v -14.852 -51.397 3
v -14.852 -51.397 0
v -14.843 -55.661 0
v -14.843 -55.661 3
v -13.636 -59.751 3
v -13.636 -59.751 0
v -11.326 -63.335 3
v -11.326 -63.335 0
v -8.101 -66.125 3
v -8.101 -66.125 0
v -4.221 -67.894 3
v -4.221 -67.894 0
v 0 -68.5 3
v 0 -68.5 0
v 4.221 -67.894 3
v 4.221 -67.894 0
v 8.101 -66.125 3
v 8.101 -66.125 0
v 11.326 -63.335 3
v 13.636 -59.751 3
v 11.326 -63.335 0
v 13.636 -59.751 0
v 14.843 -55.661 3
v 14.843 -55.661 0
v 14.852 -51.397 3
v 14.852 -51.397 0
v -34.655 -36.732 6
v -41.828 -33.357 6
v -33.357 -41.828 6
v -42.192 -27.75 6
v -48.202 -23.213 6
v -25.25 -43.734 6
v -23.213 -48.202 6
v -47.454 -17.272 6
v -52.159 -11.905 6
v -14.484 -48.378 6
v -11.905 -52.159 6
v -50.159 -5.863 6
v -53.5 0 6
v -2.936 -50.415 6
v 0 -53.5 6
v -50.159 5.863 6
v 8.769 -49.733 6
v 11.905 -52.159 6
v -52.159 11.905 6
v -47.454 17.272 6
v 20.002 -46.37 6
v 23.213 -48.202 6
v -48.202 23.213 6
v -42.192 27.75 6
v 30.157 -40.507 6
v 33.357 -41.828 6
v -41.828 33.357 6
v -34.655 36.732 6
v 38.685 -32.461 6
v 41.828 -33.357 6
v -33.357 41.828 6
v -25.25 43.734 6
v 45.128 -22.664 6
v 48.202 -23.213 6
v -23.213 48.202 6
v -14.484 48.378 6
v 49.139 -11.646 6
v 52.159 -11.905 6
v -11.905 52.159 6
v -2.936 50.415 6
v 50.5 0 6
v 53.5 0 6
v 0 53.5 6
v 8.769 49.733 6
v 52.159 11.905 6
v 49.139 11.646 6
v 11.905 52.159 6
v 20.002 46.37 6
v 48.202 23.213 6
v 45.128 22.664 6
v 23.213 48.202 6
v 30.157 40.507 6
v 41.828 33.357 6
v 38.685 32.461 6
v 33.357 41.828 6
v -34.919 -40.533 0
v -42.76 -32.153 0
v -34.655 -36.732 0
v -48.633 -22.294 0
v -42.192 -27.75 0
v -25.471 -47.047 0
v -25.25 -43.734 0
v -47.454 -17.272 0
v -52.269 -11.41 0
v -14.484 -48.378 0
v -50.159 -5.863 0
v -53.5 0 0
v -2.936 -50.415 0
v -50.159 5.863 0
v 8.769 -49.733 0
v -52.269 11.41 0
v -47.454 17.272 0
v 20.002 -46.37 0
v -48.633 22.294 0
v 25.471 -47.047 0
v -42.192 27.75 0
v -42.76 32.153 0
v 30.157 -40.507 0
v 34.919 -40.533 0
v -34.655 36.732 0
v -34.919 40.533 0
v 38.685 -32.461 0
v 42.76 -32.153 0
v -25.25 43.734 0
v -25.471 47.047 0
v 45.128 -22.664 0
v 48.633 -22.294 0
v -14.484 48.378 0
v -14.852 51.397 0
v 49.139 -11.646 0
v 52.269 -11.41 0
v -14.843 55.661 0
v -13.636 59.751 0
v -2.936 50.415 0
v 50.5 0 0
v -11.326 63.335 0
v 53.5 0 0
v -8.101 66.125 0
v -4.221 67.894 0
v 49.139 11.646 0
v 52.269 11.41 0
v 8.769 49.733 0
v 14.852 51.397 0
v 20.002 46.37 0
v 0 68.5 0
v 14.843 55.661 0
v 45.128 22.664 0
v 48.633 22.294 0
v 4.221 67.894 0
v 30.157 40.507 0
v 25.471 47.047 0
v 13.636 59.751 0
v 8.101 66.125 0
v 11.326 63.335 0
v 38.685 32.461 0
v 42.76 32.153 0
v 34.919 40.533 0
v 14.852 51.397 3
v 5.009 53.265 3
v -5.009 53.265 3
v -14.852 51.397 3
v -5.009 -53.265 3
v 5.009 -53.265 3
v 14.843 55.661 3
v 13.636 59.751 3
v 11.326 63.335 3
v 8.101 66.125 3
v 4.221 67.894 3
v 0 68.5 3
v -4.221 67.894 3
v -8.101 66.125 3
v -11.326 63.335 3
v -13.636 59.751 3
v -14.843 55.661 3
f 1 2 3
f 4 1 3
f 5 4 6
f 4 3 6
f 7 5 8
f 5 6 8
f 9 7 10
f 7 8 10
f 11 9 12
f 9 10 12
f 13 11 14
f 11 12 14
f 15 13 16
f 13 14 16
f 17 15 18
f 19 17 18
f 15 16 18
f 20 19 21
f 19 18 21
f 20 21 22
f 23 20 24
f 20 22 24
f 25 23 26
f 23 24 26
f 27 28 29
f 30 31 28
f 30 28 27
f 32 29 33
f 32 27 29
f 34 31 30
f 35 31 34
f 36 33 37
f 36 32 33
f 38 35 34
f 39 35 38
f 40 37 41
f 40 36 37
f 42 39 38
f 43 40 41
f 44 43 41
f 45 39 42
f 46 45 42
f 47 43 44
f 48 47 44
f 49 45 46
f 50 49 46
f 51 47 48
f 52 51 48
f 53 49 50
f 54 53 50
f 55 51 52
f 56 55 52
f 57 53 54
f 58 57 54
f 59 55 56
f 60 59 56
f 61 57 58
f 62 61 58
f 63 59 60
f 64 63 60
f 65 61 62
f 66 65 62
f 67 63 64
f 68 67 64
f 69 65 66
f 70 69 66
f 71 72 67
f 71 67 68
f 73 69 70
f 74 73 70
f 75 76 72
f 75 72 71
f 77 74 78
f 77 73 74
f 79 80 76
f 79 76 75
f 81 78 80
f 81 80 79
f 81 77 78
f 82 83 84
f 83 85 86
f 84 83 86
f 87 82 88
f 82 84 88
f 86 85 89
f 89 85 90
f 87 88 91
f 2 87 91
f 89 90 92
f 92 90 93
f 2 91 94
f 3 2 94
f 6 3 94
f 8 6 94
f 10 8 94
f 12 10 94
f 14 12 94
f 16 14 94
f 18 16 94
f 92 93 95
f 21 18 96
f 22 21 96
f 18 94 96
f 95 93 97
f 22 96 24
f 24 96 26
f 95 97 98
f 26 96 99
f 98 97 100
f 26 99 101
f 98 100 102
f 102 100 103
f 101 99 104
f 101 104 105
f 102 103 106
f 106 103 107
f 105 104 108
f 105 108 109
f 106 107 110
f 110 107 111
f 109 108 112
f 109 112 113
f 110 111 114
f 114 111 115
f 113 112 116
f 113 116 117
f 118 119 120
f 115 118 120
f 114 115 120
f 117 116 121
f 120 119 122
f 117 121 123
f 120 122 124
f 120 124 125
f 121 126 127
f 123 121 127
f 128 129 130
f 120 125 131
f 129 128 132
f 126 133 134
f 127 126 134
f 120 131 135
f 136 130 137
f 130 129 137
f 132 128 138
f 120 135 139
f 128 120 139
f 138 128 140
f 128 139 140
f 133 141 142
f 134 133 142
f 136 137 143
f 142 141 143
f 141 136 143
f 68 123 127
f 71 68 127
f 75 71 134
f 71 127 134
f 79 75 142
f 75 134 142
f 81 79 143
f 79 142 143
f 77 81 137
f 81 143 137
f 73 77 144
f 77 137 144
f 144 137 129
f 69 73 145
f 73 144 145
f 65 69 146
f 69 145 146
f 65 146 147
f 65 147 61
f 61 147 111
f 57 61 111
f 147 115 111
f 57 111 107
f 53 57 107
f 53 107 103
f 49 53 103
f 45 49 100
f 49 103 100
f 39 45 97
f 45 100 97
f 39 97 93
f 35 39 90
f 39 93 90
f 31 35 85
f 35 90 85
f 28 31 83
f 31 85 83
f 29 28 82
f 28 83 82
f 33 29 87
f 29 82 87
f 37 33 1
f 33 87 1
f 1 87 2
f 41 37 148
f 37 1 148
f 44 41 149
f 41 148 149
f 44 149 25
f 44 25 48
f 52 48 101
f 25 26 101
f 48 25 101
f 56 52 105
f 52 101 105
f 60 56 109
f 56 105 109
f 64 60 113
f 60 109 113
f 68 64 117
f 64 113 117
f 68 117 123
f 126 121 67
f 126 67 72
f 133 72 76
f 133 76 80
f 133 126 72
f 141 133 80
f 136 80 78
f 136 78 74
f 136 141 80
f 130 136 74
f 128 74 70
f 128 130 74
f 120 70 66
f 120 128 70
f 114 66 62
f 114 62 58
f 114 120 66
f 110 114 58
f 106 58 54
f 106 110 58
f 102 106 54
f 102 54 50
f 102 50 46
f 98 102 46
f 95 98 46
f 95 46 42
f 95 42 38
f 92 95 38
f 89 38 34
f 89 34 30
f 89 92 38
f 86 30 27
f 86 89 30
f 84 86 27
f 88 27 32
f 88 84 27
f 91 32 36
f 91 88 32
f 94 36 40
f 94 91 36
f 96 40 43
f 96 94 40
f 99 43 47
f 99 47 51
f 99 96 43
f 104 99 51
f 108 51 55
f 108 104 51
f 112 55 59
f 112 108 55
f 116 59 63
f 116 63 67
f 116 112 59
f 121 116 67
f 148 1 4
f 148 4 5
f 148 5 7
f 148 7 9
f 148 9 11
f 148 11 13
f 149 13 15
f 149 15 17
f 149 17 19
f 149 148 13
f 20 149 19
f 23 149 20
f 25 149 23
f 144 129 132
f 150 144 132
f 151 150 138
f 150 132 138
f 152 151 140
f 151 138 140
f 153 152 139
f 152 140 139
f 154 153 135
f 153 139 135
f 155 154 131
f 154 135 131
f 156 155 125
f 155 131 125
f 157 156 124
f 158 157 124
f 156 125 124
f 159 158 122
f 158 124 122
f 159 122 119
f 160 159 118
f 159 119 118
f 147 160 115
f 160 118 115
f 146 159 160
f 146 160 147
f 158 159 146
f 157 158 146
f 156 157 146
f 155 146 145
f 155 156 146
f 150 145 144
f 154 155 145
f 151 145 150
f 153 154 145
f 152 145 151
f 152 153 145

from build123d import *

# Parameters (mm, degrees)
F0_R     = 53.5
F0_R_2   = 50.5
F1_DEPTH = 6
F3_DEPTH = 3


with BuildPart() as f1:
    # F0 (on Top) → F1 (new body)
    with BuildSketch(Plane.XY):
        Circle(F0_R)
        Circle(F0_R_2, mode=Mode.SUBTRACT)
    extrude(amount=F1_DEPTH)

    # F2 (on Top) → F3 (join)
    with BuildSketch(Plane.XY):
        with BuildLine():
            ThreePointArc((14.851876, -51.397196), (0, -53.5), (-14.851876, -51.397196))
            ThreePointArc((-14.851876, -51.397196), (0, -68.5), (14.851876, -51.397196))
        make_face()
        with BuildLine():
            ThreePointArc((-14.851876, 51.397196), (0, 53.5), (14.851876, 51.397196))
            ThreePointArc((14.851876, 51.397196), (0, 68.5), (-14.851876, 51.397196))
        make_face()
    extrude(amount=F3_DEPTH)


solid = f1.part
